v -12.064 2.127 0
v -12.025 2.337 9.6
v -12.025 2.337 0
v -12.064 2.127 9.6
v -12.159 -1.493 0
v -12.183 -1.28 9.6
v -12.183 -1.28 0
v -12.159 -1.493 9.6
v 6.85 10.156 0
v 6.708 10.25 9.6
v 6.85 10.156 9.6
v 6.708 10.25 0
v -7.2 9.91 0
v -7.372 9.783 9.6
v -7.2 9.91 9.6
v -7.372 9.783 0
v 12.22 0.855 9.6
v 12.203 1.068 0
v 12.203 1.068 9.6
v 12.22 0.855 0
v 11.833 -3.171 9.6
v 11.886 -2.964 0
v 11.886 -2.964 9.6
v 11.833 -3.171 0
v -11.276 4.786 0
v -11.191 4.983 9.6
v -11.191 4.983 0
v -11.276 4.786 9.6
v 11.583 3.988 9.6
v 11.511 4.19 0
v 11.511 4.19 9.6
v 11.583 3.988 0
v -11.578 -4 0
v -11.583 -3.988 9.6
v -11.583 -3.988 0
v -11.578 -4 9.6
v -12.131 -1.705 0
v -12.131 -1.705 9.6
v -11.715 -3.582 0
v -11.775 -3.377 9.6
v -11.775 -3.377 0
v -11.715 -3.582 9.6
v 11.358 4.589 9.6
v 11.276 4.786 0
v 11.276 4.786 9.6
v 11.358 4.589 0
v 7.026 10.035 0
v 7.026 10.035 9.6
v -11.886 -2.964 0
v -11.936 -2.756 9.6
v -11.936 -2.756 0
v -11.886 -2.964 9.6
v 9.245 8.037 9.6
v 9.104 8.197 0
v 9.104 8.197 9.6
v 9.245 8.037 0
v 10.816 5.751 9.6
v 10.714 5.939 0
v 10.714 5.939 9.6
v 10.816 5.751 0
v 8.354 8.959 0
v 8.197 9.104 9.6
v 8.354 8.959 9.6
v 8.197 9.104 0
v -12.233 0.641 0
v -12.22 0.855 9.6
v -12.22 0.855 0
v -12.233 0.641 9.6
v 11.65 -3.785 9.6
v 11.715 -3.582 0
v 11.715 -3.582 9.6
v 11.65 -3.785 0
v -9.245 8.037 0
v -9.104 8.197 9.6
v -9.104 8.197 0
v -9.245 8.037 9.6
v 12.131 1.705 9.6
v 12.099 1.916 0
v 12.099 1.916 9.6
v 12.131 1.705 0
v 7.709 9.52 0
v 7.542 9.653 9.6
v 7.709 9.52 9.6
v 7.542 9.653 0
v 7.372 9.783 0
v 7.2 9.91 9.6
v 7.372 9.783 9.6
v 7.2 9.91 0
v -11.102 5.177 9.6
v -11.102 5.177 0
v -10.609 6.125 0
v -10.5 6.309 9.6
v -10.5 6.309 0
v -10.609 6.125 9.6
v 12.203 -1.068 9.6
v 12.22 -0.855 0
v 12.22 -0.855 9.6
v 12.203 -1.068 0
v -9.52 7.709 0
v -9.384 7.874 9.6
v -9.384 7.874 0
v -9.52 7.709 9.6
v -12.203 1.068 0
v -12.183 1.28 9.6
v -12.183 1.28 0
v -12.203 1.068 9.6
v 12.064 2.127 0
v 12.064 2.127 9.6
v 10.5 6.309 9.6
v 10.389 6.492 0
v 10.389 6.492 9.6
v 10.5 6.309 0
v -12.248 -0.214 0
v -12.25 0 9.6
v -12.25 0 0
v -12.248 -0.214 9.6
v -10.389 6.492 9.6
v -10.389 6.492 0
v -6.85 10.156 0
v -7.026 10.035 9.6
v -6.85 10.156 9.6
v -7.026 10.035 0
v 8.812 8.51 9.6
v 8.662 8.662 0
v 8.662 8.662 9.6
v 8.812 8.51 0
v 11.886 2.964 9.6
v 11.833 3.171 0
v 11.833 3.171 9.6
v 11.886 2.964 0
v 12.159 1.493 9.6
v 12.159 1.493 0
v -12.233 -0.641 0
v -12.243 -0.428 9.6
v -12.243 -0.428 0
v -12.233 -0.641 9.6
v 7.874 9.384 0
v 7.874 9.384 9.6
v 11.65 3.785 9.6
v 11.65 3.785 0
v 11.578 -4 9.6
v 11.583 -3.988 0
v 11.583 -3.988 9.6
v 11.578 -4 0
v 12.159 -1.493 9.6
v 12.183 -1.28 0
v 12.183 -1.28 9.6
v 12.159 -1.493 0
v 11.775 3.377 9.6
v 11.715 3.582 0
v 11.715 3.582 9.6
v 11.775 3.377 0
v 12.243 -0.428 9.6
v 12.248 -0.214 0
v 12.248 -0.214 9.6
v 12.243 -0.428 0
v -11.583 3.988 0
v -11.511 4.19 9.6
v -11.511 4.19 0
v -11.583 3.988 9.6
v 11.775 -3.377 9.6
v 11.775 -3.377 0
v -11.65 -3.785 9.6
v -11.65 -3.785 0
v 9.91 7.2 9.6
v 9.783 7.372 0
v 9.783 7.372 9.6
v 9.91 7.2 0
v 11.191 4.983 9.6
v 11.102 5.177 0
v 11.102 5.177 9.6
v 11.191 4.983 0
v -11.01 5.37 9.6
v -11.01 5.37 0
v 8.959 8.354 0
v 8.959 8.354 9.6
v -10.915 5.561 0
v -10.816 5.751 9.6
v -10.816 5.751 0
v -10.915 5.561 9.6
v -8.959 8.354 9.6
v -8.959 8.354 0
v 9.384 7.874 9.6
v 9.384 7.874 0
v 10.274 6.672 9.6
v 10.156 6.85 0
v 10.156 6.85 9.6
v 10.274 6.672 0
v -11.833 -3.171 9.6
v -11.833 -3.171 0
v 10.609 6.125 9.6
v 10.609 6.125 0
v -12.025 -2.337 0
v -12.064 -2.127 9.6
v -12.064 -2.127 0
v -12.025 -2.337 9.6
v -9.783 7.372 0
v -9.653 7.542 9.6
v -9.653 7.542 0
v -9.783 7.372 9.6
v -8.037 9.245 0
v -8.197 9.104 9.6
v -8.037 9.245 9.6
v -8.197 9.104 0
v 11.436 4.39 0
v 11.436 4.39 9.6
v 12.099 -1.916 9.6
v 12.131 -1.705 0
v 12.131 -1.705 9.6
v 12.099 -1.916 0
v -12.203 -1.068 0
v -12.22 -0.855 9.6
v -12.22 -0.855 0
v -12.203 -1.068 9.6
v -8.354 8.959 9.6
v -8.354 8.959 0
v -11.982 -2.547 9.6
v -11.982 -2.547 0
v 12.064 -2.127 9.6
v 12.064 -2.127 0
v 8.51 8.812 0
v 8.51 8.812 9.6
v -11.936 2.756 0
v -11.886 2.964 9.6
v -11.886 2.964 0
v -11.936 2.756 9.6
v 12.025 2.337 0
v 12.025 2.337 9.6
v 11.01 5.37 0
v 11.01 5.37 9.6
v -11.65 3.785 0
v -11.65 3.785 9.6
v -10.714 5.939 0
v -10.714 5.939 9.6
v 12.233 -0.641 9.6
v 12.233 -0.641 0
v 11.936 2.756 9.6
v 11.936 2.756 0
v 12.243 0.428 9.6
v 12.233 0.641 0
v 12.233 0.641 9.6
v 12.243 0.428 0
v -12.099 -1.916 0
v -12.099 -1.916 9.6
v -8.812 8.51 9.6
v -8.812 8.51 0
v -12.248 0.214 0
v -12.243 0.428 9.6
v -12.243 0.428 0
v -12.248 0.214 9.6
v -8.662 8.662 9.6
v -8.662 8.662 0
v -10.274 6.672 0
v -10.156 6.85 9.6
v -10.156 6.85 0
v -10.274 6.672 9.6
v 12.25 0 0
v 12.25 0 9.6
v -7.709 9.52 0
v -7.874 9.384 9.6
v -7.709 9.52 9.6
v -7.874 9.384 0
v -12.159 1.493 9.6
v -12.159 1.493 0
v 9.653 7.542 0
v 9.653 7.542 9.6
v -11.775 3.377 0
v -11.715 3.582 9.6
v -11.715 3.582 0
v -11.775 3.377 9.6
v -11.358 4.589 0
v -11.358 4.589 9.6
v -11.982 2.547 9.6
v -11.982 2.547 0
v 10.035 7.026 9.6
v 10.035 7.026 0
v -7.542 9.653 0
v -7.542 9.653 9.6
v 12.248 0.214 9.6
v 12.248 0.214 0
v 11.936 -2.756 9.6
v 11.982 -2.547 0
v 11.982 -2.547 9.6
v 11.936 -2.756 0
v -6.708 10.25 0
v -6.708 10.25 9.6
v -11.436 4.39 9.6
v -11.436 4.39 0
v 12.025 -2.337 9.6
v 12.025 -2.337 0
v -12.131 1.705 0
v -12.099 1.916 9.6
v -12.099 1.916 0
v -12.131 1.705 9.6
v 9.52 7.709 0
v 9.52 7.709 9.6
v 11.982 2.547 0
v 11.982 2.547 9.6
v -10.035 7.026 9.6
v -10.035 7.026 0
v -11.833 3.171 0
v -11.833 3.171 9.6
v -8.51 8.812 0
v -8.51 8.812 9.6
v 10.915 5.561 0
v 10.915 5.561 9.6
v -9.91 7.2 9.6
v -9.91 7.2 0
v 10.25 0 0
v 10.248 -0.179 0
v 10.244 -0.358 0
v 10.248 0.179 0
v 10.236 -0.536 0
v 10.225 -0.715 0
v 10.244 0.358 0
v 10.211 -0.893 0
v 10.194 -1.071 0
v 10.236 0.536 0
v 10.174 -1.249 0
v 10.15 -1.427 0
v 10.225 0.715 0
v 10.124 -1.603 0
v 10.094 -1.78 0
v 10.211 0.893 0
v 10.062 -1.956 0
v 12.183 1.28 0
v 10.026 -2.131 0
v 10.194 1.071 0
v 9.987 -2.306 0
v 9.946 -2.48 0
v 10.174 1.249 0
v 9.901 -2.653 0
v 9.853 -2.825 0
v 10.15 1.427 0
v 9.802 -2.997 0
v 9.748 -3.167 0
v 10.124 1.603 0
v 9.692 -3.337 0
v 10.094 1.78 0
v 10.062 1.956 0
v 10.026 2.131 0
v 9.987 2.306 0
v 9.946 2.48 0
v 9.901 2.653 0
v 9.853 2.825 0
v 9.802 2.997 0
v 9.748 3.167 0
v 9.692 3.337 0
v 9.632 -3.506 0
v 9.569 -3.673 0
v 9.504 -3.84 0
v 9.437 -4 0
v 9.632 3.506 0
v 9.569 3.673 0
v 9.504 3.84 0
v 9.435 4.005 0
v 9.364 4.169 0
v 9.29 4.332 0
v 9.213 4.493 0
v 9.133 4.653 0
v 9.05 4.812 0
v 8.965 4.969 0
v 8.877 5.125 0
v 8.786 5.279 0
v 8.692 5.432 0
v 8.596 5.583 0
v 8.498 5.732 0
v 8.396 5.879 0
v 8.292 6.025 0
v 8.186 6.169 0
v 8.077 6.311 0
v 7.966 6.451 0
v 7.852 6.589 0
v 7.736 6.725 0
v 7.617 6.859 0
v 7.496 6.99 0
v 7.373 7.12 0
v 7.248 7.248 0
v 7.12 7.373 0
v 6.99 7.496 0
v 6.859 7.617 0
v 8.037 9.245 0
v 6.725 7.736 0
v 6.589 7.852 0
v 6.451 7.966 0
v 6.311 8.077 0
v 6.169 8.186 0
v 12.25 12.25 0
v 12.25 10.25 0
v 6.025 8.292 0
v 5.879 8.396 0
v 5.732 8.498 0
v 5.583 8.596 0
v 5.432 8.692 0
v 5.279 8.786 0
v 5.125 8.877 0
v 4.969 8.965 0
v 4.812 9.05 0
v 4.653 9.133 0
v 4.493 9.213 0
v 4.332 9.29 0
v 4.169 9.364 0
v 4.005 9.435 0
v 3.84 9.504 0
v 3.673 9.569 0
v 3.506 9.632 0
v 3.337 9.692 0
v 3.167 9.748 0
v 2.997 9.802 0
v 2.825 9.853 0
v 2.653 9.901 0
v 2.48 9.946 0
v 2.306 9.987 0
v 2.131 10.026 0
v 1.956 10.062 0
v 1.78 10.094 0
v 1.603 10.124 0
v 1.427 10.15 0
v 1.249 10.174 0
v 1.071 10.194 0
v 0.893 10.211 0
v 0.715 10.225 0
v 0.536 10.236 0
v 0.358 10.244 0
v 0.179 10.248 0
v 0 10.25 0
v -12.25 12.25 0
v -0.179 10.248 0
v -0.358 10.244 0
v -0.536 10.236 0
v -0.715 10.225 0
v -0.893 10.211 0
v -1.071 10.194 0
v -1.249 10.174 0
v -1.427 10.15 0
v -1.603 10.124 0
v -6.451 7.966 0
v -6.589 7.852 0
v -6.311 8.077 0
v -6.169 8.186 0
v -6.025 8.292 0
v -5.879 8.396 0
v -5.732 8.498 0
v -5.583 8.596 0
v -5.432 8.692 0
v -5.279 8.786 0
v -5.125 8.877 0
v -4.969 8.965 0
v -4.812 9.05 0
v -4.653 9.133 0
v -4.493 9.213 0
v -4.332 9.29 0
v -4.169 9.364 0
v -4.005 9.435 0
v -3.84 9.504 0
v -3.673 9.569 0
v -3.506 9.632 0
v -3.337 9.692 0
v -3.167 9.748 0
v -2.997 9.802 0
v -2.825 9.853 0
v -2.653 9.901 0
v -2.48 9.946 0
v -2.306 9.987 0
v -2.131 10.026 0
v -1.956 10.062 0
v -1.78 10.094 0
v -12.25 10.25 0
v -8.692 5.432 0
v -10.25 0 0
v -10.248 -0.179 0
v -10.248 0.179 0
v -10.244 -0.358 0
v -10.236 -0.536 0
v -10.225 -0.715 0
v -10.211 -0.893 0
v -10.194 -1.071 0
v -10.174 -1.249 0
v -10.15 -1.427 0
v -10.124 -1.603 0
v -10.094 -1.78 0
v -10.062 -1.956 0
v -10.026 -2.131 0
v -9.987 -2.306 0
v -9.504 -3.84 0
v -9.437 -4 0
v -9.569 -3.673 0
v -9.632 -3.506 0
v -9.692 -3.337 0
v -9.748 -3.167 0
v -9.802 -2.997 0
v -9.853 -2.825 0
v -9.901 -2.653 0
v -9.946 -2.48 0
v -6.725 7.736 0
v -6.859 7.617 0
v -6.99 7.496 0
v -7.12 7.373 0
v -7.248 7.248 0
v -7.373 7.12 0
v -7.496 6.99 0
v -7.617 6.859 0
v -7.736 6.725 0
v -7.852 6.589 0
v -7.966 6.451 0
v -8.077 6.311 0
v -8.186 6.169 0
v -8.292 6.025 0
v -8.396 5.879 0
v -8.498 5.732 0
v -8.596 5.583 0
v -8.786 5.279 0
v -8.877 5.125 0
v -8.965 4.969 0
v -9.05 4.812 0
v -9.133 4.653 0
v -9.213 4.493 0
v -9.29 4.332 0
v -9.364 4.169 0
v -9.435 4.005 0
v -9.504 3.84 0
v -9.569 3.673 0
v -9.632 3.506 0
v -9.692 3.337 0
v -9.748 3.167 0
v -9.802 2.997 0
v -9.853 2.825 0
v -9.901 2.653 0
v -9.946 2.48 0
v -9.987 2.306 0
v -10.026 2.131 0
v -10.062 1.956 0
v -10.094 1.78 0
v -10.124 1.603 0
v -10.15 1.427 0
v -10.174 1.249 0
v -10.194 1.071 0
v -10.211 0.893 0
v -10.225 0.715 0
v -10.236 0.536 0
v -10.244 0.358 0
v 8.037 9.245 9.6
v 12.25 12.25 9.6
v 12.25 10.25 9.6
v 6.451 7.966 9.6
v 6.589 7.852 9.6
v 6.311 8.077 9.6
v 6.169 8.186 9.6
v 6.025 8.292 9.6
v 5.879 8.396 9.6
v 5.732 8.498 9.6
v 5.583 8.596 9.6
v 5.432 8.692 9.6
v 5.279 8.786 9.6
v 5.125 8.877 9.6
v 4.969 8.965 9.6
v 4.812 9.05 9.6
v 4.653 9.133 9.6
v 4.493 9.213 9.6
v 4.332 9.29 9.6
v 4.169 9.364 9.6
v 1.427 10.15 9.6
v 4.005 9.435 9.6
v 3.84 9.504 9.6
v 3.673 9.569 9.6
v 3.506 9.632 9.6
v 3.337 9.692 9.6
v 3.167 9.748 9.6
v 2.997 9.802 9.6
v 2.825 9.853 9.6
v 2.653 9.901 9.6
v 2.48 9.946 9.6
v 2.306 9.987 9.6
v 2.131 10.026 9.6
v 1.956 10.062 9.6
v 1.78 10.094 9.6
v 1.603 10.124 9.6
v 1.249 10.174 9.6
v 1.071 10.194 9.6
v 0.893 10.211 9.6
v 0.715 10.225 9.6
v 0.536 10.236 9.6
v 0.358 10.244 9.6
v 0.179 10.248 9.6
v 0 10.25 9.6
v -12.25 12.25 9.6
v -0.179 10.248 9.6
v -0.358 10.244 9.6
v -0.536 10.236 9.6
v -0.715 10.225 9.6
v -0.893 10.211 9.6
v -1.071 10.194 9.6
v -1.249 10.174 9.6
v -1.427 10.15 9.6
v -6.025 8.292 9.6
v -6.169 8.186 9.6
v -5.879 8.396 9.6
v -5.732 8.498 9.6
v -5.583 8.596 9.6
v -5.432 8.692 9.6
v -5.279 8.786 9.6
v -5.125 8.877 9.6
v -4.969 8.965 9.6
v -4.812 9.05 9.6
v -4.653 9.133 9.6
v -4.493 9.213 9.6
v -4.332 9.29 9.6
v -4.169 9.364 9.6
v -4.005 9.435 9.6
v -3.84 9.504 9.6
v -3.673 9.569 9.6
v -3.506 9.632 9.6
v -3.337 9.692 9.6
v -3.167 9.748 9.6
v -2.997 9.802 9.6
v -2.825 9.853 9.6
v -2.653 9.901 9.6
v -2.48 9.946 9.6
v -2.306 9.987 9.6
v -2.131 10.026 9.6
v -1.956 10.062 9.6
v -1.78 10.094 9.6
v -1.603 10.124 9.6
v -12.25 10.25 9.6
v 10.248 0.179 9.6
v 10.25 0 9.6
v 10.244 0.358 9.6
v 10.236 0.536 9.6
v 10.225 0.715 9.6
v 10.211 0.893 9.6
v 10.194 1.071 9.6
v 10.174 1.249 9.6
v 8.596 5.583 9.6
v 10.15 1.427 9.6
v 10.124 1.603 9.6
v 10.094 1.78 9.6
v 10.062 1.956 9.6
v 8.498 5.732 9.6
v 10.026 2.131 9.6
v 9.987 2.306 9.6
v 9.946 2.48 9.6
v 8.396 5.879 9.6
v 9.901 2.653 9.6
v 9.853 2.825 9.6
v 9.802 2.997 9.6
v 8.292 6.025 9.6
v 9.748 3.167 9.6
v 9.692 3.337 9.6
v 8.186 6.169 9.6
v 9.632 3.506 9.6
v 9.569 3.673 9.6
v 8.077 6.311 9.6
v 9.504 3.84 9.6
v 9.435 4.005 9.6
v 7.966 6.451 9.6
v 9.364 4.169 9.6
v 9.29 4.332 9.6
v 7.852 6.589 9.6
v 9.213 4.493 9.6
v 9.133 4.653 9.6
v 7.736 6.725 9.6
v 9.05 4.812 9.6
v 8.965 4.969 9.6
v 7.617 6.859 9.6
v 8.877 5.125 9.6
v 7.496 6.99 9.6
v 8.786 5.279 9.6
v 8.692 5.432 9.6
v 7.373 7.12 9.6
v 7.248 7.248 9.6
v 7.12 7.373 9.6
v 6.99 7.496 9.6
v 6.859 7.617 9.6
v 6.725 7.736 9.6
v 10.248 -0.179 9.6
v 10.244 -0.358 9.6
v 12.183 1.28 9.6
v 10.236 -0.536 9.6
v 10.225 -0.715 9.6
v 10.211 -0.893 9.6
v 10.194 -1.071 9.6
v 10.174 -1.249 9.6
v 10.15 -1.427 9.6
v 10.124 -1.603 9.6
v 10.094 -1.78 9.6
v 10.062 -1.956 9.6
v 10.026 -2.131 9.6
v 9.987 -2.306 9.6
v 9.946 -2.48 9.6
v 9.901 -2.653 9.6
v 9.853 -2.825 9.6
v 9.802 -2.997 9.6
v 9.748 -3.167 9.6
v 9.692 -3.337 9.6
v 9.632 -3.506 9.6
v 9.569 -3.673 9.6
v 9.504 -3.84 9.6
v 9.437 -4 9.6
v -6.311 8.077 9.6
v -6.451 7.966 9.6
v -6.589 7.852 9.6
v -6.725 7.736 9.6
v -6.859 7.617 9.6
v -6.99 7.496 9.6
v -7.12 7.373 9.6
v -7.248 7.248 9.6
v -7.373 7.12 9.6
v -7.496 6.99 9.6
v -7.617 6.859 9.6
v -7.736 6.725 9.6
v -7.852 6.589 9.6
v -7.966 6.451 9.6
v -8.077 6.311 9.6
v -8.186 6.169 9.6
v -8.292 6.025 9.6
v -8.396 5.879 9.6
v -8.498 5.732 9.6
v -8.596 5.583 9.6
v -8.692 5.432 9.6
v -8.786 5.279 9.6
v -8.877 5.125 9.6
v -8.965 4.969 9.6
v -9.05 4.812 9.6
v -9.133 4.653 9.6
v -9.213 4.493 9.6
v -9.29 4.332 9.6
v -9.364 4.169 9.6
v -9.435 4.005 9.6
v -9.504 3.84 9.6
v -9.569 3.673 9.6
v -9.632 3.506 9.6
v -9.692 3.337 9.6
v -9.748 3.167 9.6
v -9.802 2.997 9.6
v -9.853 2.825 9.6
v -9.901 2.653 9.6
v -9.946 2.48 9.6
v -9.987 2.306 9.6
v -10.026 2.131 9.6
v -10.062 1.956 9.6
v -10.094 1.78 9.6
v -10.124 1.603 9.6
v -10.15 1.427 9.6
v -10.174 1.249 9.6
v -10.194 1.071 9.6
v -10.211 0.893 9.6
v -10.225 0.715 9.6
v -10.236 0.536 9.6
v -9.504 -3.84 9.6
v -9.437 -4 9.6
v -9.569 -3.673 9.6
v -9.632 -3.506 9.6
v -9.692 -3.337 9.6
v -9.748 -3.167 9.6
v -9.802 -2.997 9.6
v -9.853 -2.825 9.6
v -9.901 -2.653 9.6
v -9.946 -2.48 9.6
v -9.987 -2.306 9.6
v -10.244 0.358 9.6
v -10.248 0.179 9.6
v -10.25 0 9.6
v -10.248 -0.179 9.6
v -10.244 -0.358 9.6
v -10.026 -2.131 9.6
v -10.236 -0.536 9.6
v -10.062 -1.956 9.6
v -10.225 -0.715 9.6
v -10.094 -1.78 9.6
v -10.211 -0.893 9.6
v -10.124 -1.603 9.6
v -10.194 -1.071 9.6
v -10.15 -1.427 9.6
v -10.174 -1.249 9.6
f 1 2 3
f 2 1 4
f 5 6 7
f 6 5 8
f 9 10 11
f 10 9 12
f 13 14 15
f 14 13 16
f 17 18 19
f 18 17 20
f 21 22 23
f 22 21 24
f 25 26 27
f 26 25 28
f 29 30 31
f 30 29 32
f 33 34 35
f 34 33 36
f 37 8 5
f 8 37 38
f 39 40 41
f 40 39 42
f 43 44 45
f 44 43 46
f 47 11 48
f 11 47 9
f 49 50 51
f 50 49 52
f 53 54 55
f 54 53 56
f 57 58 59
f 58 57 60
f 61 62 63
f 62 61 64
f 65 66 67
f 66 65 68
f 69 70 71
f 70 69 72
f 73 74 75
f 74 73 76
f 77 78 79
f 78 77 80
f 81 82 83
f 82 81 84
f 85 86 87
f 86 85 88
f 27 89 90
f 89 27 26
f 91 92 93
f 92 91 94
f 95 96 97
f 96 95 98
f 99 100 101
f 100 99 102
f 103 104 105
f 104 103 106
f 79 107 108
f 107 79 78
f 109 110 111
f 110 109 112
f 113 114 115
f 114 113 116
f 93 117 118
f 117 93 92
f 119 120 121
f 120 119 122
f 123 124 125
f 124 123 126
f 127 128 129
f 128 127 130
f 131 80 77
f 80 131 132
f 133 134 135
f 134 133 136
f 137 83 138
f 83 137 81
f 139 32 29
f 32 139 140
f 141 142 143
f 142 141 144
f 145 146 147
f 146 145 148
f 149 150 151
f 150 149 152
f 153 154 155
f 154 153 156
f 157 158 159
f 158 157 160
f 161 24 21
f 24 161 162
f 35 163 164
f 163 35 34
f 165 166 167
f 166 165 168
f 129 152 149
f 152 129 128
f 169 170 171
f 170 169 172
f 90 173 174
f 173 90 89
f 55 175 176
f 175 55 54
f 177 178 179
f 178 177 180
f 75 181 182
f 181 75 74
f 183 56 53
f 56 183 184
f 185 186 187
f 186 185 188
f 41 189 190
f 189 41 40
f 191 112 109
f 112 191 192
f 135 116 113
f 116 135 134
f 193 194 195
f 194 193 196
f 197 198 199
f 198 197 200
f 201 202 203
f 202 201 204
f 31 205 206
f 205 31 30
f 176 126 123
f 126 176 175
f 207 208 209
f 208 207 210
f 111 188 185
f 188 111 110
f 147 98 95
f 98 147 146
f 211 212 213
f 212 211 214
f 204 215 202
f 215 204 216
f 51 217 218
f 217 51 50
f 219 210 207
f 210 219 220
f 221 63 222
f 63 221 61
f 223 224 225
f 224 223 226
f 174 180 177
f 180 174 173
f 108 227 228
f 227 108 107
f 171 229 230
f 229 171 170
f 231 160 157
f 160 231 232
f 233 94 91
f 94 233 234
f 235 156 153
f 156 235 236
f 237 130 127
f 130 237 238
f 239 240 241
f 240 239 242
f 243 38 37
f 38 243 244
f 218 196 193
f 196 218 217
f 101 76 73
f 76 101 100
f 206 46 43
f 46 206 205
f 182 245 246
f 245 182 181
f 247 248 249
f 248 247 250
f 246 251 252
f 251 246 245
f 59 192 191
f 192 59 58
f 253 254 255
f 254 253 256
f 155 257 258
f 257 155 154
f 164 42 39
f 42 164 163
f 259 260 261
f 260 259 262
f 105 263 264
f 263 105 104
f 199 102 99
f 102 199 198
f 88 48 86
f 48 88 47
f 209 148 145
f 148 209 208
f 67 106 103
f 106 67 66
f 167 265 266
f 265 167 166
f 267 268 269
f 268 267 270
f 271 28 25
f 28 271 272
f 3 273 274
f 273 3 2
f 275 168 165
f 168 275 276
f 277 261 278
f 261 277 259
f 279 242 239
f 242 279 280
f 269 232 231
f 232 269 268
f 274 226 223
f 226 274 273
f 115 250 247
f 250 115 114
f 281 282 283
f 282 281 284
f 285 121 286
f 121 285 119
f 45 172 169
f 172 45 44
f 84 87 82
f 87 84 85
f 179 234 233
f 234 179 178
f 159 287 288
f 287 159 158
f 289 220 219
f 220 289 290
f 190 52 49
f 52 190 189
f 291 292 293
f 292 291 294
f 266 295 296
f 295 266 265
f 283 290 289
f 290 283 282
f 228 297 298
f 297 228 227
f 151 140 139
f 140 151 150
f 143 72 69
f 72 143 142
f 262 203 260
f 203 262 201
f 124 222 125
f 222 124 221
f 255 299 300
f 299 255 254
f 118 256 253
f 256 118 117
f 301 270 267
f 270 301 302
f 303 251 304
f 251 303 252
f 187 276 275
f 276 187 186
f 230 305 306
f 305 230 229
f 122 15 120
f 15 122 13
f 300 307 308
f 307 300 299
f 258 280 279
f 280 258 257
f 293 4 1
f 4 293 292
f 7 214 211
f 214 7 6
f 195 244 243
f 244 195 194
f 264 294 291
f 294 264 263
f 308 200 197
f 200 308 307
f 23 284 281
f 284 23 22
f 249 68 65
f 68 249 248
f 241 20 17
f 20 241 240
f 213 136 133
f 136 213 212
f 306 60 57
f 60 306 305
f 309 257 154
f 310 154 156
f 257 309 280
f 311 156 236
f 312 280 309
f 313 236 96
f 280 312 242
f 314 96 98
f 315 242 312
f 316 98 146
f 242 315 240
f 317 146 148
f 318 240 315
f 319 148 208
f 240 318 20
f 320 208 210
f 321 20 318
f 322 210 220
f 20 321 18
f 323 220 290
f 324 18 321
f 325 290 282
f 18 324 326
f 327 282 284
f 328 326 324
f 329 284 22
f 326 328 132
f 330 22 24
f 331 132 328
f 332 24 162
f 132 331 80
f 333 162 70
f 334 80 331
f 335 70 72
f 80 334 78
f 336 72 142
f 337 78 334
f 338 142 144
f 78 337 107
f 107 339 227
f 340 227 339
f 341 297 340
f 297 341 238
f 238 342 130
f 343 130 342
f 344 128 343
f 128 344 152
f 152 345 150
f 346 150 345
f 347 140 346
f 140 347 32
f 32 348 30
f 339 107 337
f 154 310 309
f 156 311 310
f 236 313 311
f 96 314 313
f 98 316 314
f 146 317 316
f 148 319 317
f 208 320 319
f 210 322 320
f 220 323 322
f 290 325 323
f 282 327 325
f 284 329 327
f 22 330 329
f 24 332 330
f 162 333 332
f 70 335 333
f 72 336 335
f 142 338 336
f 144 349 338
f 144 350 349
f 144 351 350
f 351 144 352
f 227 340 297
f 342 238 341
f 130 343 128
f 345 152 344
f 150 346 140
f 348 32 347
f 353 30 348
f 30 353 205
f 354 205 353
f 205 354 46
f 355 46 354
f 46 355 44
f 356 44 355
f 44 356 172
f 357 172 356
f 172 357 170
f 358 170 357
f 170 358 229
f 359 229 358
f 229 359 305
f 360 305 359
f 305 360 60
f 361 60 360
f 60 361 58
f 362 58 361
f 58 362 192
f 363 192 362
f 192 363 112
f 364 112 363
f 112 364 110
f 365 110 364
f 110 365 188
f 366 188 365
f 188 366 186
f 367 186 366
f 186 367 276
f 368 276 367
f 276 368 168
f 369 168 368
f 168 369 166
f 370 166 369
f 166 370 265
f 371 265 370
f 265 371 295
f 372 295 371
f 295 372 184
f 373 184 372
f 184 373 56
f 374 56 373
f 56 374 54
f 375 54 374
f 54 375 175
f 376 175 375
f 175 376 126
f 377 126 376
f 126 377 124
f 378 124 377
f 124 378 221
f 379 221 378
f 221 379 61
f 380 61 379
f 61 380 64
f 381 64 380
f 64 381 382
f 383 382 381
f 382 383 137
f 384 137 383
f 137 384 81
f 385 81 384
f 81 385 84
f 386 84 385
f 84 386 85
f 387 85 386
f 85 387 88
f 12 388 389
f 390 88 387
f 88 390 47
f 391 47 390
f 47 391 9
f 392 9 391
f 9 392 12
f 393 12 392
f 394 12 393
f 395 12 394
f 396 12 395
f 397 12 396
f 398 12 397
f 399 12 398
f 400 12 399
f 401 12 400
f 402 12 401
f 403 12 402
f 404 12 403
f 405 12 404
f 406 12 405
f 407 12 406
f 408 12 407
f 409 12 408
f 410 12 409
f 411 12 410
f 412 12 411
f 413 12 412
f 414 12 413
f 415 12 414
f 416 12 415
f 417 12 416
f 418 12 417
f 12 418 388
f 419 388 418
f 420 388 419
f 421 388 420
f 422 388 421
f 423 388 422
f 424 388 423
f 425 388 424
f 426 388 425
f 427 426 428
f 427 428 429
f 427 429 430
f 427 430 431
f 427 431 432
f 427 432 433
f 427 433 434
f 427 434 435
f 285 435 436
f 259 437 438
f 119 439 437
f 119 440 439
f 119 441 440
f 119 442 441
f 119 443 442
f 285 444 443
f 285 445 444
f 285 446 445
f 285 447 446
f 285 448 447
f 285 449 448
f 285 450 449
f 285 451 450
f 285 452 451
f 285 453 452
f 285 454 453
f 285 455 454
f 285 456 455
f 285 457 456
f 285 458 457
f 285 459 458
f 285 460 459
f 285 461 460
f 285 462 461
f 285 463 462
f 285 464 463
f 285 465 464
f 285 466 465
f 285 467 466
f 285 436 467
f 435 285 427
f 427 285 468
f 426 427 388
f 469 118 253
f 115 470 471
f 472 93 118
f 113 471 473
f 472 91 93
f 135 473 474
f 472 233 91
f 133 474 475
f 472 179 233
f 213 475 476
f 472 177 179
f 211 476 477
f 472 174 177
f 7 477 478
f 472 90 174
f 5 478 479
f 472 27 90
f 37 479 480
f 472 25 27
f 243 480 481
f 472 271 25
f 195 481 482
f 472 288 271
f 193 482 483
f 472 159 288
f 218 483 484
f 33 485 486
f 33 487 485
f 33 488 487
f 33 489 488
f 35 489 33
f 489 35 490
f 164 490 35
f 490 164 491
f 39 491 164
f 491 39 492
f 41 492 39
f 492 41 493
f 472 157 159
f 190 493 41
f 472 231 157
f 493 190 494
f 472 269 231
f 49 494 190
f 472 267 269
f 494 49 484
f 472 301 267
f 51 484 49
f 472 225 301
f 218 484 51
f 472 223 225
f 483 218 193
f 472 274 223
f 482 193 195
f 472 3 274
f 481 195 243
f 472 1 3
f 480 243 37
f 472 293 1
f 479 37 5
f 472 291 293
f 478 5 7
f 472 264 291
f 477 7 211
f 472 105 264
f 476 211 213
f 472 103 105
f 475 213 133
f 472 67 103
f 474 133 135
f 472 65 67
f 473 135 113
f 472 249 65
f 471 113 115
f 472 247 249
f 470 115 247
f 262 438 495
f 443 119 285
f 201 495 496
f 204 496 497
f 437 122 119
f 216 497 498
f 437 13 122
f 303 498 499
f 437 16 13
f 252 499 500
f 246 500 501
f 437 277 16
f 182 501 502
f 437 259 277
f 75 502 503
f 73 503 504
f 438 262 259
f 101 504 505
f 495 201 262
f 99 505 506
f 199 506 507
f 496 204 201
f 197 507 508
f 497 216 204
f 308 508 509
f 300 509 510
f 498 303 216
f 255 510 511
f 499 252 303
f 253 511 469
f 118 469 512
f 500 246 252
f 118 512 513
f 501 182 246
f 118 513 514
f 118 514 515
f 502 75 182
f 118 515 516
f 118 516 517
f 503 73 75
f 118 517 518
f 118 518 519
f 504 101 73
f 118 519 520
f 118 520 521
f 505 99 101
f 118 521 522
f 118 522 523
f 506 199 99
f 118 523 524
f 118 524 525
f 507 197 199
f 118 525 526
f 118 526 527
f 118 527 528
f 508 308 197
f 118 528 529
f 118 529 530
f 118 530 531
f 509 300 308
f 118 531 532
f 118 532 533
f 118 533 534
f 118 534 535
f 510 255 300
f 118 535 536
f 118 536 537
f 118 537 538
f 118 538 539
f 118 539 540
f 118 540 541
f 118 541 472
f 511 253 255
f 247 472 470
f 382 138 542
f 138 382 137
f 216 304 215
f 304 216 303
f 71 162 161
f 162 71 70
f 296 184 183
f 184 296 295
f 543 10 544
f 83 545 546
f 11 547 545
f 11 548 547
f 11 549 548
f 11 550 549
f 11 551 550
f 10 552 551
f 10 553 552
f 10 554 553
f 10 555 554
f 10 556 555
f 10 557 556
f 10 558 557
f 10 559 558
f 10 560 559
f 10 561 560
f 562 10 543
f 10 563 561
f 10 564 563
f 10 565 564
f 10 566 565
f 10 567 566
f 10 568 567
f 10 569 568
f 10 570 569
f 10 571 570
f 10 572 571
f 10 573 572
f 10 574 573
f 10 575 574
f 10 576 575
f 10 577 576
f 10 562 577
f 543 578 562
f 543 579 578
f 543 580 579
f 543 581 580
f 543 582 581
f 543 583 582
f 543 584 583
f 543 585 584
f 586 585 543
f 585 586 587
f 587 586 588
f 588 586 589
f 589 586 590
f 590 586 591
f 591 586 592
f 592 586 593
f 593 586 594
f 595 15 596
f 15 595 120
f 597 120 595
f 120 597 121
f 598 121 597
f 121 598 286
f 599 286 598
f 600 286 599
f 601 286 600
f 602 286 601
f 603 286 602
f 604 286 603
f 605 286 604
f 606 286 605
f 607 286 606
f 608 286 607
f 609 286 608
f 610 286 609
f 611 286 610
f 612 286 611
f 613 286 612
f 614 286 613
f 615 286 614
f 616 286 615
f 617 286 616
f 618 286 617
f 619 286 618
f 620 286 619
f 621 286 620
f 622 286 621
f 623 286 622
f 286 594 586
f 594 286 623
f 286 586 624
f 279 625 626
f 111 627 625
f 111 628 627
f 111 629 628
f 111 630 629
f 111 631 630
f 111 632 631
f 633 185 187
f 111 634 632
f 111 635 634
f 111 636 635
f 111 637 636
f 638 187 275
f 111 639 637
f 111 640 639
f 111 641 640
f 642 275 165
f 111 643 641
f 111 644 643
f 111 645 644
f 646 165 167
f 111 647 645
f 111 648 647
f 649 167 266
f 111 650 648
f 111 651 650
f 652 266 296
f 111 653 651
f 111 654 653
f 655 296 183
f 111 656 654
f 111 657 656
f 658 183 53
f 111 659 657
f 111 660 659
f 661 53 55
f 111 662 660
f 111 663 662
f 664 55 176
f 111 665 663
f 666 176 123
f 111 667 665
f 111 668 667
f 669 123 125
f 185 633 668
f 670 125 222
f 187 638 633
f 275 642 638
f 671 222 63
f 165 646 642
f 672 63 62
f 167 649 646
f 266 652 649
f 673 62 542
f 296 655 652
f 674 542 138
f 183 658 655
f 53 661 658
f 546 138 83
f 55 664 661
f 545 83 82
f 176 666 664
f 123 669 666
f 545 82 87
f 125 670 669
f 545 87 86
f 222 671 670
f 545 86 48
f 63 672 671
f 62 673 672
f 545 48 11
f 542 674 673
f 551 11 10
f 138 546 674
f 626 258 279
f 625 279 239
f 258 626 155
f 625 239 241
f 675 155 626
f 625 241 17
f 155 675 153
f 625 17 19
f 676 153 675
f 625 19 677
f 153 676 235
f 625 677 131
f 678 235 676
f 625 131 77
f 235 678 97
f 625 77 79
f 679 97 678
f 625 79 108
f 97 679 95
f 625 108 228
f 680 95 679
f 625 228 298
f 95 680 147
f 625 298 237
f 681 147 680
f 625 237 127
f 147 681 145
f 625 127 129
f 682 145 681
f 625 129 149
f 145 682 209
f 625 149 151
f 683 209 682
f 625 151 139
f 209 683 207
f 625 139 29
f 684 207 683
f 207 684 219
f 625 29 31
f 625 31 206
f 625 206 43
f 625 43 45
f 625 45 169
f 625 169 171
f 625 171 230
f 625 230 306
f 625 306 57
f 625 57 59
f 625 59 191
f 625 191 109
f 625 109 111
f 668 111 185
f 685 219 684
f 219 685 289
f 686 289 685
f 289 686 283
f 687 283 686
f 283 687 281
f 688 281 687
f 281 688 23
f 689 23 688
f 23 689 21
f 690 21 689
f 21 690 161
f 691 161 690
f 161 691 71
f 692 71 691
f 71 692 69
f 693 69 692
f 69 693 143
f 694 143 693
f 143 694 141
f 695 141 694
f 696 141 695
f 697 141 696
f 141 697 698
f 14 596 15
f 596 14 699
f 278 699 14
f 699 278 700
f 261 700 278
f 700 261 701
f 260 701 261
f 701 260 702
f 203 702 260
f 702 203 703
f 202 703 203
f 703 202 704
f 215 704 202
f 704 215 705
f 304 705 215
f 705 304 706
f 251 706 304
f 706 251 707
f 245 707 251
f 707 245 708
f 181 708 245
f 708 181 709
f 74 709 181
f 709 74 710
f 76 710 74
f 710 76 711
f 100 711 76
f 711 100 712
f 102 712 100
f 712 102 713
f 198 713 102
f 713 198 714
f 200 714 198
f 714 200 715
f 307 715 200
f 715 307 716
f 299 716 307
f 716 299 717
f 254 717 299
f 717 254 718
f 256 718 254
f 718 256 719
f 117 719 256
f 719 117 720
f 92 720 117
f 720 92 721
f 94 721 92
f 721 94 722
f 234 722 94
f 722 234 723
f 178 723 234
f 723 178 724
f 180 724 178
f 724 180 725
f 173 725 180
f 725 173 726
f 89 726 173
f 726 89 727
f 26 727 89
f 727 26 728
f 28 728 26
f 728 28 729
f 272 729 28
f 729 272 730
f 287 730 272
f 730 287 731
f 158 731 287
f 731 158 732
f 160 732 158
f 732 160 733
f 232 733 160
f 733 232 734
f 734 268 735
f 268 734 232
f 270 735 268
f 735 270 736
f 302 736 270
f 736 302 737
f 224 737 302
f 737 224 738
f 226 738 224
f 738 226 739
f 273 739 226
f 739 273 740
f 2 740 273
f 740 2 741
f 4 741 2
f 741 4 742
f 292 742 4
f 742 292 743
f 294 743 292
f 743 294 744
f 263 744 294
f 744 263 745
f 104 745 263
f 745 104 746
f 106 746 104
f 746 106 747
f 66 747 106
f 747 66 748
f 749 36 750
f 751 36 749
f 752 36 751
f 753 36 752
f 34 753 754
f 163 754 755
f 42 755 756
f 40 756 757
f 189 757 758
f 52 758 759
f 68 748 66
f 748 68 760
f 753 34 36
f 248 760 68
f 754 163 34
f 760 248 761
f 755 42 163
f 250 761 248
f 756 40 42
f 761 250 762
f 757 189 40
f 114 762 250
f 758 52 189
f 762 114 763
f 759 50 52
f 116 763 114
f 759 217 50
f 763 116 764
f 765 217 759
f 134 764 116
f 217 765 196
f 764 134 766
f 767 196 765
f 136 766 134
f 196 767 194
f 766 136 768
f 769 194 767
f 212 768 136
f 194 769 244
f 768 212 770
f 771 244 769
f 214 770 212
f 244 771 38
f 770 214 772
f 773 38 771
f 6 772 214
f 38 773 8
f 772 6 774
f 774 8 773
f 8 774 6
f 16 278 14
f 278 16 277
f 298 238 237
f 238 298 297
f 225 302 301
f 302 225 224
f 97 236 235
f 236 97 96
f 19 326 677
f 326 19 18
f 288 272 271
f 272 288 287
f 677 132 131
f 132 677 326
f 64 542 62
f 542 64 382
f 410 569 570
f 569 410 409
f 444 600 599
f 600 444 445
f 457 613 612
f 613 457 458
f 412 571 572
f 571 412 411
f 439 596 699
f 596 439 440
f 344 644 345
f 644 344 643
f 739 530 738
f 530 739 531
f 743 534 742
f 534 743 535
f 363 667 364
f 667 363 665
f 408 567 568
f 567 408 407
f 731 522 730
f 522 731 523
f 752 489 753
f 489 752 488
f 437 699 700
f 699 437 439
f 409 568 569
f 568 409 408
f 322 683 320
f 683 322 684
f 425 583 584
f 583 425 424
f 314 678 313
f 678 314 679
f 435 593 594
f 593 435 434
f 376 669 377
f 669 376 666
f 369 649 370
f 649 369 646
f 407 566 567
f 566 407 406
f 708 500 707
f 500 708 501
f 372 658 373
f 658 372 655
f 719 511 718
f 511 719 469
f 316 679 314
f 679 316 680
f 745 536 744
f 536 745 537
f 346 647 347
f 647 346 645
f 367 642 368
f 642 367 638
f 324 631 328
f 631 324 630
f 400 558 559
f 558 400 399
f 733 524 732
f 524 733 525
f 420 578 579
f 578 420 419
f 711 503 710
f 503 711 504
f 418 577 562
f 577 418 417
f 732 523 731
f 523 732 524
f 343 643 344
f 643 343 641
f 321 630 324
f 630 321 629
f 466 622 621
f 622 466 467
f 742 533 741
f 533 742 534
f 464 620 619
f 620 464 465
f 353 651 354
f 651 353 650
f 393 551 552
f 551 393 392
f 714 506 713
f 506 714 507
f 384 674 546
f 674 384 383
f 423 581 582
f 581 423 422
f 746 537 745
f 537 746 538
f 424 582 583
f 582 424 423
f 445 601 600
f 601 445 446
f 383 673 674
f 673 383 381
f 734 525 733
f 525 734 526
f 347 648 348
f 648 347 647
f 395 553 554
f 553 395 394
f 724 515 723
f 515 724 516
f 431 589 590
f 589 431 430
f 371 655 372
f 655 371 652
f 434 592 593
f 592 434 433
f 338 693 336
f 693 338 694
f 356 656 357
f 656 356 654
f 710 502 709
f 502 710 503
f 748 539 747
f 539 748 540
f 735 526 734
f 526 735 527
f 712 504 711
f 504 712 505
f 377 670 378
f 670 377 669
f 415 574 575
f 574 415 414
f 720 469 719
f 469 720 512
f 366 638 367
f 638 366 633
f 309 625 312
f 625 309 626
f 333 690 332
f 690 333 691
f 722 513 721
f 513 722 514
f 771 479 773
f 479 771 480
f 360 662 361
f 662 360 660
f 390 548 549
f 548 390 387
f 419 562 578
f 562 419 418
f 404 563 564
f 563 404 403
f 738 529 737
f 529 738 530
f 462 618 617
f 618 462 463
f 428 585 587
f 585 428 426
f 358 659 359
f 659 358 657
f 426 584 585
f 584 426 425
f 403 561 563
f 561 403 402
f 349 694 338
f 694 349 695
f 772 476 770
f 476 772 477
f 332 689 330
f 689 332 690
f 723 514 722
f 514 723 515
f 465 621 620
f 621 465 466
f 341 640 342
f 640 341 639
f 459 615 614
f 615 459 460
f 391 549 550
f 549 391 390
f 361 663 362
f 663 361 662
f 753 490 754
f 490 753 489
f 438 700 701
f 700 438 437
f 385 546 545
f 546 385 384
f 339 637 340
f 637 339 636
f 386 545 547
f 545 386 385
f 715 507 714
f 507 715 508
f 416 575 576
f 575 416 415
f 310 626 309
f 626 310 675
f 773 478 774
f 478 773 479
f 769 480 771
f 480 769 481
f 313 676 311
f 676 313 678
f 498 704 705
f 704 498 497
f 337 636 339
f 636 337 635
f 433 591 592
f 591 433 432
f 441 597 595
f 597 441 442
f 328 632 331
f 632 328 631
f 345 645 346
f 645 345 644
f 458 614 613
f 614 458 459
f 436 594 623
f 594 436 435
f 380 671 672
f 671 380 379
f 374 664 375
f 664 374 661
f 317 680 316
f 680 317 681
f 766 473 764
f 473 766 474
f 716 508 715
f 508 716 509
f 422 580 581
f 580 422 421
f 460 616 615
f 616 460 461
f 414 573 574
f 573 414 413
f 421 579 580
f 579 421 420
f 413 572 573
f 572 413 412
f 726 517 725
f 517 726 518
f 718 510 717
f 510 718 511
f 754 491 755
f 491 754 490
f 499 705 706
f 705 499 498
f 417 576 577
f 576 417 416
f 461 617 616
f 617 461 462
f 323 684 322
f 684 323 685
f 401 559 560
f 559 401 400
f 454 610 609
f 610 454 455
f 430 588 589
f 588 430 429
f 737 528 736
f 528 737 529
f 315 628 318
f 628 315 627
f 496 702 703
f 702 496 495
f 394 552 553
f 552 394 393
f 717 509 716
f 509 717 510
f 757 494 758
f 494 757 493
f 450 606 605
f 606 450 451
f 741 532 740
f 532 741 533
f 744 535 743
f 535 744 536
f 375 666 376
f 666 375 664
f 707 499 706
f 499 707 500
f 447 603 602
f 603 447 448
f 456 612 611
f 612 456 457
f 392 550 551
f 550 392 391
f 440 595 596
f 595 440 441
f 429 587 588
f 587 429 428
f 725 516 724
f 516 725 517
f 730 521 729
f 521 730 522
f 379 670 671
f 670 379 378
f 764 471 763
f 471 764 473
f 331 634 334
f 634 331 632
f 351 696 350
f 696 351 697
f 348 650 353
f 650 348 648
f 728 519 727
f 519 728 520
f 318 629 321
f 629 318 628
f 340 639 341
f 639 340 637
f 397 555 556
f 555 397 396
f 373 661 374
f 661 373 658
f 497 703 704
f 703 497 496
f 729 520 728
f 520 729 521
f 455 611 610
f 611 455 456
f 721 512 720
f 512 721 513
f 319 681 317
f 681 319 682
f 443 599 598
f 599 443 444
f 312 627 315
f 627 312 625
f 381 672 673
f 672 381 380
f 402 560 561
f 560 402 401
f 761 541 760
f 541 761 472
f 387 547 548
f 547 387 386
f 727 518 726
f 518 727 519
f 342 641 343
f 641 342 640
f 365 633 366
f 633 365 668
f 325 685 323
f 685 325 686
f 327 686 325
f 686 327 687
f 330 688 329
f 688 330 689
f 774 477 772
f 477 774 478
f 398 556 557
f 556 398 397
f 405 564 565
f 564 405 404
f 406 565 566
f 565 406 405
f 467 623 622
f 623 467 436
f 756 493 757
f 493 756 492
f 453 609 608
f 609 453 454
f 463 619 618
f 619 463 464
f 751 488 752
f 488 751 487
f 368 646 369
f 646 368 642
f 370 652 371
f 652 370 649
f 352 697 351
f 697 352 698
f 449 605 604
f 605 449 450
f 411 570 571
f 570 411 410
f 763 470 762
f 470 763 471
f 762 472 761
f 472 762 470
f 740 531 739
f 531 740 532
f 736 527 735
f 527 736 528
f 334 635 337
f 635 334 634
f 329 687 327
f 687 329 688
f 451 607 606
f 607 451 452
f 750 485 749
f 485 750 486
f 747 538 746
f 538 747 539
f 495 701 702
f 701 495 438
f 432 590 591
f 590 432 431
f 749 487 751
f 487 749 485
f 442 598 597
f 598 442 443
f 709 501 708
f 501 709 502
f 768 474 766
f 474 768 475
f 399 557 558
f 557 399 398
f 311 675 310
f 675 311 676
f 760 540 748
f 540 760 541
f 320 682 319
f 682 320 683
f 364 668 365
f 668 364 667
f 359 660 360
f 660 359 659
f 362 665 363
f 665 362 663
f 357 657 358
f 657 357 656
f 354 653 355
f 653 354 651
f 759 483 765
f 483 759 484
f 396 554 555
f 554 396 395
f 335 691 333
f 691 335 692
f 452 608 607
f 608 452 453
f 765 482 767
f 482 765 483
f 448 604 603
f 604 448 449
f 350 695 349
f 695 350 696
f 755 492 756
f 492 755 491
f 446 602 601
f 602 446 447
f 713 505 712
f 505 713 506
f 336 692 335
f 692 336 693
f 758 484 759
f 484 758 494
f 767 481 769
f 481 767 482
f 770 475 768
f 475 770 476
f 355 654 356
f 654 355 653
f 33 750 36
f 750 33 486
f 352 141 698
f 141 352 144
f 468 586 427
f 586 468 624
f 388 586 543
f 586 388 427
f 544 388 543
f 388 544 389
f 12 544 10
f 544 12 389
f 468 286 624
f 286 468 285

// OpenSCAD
$dia = 20.5;
$ldia = $dia;
$r = $dia / 2;
$schwertdicke = 9.5;
$thickness = 2;

module innerconnectorcutter()
{
hull() {
linear_extrude(height = 0.1)
circle(d=$ldia,$fn=360); //Das muss ich an der Stelle $schwertdicke messen

translate([0,0,$schwertdicke])
linear_extrude(height = 0.1)
circle(d=$dia,$fn=360);
}
}

module outerconnector()
{
hull() {
linear_extrude(height = 0.1)
circle(d=$ldia+$thickness*2,$fn=360);

translate([0,0,$schwertdicke])
linear_extrude(height = 0.1)
circle(d=$dia+$thickness*2,$fn=360);
}
}

module fullconnector()
{
difference()
{
outerconnector();
innerconnectorcutter();
}
}

difference() {
fullconnector();

translate([-$r-$thickness,-$r-$thickness,0])
linear_extrude(height = $schwertdicke+0.1)
square([$dia+$thickness*2,$dia-($dia/2)-$thickness*1]);
}

linear_extrude(height = $schwertdicke+0.1)
translate([-$r-$thickness,$r,0])
square([$dia+$thickness*2, $thickness]);
